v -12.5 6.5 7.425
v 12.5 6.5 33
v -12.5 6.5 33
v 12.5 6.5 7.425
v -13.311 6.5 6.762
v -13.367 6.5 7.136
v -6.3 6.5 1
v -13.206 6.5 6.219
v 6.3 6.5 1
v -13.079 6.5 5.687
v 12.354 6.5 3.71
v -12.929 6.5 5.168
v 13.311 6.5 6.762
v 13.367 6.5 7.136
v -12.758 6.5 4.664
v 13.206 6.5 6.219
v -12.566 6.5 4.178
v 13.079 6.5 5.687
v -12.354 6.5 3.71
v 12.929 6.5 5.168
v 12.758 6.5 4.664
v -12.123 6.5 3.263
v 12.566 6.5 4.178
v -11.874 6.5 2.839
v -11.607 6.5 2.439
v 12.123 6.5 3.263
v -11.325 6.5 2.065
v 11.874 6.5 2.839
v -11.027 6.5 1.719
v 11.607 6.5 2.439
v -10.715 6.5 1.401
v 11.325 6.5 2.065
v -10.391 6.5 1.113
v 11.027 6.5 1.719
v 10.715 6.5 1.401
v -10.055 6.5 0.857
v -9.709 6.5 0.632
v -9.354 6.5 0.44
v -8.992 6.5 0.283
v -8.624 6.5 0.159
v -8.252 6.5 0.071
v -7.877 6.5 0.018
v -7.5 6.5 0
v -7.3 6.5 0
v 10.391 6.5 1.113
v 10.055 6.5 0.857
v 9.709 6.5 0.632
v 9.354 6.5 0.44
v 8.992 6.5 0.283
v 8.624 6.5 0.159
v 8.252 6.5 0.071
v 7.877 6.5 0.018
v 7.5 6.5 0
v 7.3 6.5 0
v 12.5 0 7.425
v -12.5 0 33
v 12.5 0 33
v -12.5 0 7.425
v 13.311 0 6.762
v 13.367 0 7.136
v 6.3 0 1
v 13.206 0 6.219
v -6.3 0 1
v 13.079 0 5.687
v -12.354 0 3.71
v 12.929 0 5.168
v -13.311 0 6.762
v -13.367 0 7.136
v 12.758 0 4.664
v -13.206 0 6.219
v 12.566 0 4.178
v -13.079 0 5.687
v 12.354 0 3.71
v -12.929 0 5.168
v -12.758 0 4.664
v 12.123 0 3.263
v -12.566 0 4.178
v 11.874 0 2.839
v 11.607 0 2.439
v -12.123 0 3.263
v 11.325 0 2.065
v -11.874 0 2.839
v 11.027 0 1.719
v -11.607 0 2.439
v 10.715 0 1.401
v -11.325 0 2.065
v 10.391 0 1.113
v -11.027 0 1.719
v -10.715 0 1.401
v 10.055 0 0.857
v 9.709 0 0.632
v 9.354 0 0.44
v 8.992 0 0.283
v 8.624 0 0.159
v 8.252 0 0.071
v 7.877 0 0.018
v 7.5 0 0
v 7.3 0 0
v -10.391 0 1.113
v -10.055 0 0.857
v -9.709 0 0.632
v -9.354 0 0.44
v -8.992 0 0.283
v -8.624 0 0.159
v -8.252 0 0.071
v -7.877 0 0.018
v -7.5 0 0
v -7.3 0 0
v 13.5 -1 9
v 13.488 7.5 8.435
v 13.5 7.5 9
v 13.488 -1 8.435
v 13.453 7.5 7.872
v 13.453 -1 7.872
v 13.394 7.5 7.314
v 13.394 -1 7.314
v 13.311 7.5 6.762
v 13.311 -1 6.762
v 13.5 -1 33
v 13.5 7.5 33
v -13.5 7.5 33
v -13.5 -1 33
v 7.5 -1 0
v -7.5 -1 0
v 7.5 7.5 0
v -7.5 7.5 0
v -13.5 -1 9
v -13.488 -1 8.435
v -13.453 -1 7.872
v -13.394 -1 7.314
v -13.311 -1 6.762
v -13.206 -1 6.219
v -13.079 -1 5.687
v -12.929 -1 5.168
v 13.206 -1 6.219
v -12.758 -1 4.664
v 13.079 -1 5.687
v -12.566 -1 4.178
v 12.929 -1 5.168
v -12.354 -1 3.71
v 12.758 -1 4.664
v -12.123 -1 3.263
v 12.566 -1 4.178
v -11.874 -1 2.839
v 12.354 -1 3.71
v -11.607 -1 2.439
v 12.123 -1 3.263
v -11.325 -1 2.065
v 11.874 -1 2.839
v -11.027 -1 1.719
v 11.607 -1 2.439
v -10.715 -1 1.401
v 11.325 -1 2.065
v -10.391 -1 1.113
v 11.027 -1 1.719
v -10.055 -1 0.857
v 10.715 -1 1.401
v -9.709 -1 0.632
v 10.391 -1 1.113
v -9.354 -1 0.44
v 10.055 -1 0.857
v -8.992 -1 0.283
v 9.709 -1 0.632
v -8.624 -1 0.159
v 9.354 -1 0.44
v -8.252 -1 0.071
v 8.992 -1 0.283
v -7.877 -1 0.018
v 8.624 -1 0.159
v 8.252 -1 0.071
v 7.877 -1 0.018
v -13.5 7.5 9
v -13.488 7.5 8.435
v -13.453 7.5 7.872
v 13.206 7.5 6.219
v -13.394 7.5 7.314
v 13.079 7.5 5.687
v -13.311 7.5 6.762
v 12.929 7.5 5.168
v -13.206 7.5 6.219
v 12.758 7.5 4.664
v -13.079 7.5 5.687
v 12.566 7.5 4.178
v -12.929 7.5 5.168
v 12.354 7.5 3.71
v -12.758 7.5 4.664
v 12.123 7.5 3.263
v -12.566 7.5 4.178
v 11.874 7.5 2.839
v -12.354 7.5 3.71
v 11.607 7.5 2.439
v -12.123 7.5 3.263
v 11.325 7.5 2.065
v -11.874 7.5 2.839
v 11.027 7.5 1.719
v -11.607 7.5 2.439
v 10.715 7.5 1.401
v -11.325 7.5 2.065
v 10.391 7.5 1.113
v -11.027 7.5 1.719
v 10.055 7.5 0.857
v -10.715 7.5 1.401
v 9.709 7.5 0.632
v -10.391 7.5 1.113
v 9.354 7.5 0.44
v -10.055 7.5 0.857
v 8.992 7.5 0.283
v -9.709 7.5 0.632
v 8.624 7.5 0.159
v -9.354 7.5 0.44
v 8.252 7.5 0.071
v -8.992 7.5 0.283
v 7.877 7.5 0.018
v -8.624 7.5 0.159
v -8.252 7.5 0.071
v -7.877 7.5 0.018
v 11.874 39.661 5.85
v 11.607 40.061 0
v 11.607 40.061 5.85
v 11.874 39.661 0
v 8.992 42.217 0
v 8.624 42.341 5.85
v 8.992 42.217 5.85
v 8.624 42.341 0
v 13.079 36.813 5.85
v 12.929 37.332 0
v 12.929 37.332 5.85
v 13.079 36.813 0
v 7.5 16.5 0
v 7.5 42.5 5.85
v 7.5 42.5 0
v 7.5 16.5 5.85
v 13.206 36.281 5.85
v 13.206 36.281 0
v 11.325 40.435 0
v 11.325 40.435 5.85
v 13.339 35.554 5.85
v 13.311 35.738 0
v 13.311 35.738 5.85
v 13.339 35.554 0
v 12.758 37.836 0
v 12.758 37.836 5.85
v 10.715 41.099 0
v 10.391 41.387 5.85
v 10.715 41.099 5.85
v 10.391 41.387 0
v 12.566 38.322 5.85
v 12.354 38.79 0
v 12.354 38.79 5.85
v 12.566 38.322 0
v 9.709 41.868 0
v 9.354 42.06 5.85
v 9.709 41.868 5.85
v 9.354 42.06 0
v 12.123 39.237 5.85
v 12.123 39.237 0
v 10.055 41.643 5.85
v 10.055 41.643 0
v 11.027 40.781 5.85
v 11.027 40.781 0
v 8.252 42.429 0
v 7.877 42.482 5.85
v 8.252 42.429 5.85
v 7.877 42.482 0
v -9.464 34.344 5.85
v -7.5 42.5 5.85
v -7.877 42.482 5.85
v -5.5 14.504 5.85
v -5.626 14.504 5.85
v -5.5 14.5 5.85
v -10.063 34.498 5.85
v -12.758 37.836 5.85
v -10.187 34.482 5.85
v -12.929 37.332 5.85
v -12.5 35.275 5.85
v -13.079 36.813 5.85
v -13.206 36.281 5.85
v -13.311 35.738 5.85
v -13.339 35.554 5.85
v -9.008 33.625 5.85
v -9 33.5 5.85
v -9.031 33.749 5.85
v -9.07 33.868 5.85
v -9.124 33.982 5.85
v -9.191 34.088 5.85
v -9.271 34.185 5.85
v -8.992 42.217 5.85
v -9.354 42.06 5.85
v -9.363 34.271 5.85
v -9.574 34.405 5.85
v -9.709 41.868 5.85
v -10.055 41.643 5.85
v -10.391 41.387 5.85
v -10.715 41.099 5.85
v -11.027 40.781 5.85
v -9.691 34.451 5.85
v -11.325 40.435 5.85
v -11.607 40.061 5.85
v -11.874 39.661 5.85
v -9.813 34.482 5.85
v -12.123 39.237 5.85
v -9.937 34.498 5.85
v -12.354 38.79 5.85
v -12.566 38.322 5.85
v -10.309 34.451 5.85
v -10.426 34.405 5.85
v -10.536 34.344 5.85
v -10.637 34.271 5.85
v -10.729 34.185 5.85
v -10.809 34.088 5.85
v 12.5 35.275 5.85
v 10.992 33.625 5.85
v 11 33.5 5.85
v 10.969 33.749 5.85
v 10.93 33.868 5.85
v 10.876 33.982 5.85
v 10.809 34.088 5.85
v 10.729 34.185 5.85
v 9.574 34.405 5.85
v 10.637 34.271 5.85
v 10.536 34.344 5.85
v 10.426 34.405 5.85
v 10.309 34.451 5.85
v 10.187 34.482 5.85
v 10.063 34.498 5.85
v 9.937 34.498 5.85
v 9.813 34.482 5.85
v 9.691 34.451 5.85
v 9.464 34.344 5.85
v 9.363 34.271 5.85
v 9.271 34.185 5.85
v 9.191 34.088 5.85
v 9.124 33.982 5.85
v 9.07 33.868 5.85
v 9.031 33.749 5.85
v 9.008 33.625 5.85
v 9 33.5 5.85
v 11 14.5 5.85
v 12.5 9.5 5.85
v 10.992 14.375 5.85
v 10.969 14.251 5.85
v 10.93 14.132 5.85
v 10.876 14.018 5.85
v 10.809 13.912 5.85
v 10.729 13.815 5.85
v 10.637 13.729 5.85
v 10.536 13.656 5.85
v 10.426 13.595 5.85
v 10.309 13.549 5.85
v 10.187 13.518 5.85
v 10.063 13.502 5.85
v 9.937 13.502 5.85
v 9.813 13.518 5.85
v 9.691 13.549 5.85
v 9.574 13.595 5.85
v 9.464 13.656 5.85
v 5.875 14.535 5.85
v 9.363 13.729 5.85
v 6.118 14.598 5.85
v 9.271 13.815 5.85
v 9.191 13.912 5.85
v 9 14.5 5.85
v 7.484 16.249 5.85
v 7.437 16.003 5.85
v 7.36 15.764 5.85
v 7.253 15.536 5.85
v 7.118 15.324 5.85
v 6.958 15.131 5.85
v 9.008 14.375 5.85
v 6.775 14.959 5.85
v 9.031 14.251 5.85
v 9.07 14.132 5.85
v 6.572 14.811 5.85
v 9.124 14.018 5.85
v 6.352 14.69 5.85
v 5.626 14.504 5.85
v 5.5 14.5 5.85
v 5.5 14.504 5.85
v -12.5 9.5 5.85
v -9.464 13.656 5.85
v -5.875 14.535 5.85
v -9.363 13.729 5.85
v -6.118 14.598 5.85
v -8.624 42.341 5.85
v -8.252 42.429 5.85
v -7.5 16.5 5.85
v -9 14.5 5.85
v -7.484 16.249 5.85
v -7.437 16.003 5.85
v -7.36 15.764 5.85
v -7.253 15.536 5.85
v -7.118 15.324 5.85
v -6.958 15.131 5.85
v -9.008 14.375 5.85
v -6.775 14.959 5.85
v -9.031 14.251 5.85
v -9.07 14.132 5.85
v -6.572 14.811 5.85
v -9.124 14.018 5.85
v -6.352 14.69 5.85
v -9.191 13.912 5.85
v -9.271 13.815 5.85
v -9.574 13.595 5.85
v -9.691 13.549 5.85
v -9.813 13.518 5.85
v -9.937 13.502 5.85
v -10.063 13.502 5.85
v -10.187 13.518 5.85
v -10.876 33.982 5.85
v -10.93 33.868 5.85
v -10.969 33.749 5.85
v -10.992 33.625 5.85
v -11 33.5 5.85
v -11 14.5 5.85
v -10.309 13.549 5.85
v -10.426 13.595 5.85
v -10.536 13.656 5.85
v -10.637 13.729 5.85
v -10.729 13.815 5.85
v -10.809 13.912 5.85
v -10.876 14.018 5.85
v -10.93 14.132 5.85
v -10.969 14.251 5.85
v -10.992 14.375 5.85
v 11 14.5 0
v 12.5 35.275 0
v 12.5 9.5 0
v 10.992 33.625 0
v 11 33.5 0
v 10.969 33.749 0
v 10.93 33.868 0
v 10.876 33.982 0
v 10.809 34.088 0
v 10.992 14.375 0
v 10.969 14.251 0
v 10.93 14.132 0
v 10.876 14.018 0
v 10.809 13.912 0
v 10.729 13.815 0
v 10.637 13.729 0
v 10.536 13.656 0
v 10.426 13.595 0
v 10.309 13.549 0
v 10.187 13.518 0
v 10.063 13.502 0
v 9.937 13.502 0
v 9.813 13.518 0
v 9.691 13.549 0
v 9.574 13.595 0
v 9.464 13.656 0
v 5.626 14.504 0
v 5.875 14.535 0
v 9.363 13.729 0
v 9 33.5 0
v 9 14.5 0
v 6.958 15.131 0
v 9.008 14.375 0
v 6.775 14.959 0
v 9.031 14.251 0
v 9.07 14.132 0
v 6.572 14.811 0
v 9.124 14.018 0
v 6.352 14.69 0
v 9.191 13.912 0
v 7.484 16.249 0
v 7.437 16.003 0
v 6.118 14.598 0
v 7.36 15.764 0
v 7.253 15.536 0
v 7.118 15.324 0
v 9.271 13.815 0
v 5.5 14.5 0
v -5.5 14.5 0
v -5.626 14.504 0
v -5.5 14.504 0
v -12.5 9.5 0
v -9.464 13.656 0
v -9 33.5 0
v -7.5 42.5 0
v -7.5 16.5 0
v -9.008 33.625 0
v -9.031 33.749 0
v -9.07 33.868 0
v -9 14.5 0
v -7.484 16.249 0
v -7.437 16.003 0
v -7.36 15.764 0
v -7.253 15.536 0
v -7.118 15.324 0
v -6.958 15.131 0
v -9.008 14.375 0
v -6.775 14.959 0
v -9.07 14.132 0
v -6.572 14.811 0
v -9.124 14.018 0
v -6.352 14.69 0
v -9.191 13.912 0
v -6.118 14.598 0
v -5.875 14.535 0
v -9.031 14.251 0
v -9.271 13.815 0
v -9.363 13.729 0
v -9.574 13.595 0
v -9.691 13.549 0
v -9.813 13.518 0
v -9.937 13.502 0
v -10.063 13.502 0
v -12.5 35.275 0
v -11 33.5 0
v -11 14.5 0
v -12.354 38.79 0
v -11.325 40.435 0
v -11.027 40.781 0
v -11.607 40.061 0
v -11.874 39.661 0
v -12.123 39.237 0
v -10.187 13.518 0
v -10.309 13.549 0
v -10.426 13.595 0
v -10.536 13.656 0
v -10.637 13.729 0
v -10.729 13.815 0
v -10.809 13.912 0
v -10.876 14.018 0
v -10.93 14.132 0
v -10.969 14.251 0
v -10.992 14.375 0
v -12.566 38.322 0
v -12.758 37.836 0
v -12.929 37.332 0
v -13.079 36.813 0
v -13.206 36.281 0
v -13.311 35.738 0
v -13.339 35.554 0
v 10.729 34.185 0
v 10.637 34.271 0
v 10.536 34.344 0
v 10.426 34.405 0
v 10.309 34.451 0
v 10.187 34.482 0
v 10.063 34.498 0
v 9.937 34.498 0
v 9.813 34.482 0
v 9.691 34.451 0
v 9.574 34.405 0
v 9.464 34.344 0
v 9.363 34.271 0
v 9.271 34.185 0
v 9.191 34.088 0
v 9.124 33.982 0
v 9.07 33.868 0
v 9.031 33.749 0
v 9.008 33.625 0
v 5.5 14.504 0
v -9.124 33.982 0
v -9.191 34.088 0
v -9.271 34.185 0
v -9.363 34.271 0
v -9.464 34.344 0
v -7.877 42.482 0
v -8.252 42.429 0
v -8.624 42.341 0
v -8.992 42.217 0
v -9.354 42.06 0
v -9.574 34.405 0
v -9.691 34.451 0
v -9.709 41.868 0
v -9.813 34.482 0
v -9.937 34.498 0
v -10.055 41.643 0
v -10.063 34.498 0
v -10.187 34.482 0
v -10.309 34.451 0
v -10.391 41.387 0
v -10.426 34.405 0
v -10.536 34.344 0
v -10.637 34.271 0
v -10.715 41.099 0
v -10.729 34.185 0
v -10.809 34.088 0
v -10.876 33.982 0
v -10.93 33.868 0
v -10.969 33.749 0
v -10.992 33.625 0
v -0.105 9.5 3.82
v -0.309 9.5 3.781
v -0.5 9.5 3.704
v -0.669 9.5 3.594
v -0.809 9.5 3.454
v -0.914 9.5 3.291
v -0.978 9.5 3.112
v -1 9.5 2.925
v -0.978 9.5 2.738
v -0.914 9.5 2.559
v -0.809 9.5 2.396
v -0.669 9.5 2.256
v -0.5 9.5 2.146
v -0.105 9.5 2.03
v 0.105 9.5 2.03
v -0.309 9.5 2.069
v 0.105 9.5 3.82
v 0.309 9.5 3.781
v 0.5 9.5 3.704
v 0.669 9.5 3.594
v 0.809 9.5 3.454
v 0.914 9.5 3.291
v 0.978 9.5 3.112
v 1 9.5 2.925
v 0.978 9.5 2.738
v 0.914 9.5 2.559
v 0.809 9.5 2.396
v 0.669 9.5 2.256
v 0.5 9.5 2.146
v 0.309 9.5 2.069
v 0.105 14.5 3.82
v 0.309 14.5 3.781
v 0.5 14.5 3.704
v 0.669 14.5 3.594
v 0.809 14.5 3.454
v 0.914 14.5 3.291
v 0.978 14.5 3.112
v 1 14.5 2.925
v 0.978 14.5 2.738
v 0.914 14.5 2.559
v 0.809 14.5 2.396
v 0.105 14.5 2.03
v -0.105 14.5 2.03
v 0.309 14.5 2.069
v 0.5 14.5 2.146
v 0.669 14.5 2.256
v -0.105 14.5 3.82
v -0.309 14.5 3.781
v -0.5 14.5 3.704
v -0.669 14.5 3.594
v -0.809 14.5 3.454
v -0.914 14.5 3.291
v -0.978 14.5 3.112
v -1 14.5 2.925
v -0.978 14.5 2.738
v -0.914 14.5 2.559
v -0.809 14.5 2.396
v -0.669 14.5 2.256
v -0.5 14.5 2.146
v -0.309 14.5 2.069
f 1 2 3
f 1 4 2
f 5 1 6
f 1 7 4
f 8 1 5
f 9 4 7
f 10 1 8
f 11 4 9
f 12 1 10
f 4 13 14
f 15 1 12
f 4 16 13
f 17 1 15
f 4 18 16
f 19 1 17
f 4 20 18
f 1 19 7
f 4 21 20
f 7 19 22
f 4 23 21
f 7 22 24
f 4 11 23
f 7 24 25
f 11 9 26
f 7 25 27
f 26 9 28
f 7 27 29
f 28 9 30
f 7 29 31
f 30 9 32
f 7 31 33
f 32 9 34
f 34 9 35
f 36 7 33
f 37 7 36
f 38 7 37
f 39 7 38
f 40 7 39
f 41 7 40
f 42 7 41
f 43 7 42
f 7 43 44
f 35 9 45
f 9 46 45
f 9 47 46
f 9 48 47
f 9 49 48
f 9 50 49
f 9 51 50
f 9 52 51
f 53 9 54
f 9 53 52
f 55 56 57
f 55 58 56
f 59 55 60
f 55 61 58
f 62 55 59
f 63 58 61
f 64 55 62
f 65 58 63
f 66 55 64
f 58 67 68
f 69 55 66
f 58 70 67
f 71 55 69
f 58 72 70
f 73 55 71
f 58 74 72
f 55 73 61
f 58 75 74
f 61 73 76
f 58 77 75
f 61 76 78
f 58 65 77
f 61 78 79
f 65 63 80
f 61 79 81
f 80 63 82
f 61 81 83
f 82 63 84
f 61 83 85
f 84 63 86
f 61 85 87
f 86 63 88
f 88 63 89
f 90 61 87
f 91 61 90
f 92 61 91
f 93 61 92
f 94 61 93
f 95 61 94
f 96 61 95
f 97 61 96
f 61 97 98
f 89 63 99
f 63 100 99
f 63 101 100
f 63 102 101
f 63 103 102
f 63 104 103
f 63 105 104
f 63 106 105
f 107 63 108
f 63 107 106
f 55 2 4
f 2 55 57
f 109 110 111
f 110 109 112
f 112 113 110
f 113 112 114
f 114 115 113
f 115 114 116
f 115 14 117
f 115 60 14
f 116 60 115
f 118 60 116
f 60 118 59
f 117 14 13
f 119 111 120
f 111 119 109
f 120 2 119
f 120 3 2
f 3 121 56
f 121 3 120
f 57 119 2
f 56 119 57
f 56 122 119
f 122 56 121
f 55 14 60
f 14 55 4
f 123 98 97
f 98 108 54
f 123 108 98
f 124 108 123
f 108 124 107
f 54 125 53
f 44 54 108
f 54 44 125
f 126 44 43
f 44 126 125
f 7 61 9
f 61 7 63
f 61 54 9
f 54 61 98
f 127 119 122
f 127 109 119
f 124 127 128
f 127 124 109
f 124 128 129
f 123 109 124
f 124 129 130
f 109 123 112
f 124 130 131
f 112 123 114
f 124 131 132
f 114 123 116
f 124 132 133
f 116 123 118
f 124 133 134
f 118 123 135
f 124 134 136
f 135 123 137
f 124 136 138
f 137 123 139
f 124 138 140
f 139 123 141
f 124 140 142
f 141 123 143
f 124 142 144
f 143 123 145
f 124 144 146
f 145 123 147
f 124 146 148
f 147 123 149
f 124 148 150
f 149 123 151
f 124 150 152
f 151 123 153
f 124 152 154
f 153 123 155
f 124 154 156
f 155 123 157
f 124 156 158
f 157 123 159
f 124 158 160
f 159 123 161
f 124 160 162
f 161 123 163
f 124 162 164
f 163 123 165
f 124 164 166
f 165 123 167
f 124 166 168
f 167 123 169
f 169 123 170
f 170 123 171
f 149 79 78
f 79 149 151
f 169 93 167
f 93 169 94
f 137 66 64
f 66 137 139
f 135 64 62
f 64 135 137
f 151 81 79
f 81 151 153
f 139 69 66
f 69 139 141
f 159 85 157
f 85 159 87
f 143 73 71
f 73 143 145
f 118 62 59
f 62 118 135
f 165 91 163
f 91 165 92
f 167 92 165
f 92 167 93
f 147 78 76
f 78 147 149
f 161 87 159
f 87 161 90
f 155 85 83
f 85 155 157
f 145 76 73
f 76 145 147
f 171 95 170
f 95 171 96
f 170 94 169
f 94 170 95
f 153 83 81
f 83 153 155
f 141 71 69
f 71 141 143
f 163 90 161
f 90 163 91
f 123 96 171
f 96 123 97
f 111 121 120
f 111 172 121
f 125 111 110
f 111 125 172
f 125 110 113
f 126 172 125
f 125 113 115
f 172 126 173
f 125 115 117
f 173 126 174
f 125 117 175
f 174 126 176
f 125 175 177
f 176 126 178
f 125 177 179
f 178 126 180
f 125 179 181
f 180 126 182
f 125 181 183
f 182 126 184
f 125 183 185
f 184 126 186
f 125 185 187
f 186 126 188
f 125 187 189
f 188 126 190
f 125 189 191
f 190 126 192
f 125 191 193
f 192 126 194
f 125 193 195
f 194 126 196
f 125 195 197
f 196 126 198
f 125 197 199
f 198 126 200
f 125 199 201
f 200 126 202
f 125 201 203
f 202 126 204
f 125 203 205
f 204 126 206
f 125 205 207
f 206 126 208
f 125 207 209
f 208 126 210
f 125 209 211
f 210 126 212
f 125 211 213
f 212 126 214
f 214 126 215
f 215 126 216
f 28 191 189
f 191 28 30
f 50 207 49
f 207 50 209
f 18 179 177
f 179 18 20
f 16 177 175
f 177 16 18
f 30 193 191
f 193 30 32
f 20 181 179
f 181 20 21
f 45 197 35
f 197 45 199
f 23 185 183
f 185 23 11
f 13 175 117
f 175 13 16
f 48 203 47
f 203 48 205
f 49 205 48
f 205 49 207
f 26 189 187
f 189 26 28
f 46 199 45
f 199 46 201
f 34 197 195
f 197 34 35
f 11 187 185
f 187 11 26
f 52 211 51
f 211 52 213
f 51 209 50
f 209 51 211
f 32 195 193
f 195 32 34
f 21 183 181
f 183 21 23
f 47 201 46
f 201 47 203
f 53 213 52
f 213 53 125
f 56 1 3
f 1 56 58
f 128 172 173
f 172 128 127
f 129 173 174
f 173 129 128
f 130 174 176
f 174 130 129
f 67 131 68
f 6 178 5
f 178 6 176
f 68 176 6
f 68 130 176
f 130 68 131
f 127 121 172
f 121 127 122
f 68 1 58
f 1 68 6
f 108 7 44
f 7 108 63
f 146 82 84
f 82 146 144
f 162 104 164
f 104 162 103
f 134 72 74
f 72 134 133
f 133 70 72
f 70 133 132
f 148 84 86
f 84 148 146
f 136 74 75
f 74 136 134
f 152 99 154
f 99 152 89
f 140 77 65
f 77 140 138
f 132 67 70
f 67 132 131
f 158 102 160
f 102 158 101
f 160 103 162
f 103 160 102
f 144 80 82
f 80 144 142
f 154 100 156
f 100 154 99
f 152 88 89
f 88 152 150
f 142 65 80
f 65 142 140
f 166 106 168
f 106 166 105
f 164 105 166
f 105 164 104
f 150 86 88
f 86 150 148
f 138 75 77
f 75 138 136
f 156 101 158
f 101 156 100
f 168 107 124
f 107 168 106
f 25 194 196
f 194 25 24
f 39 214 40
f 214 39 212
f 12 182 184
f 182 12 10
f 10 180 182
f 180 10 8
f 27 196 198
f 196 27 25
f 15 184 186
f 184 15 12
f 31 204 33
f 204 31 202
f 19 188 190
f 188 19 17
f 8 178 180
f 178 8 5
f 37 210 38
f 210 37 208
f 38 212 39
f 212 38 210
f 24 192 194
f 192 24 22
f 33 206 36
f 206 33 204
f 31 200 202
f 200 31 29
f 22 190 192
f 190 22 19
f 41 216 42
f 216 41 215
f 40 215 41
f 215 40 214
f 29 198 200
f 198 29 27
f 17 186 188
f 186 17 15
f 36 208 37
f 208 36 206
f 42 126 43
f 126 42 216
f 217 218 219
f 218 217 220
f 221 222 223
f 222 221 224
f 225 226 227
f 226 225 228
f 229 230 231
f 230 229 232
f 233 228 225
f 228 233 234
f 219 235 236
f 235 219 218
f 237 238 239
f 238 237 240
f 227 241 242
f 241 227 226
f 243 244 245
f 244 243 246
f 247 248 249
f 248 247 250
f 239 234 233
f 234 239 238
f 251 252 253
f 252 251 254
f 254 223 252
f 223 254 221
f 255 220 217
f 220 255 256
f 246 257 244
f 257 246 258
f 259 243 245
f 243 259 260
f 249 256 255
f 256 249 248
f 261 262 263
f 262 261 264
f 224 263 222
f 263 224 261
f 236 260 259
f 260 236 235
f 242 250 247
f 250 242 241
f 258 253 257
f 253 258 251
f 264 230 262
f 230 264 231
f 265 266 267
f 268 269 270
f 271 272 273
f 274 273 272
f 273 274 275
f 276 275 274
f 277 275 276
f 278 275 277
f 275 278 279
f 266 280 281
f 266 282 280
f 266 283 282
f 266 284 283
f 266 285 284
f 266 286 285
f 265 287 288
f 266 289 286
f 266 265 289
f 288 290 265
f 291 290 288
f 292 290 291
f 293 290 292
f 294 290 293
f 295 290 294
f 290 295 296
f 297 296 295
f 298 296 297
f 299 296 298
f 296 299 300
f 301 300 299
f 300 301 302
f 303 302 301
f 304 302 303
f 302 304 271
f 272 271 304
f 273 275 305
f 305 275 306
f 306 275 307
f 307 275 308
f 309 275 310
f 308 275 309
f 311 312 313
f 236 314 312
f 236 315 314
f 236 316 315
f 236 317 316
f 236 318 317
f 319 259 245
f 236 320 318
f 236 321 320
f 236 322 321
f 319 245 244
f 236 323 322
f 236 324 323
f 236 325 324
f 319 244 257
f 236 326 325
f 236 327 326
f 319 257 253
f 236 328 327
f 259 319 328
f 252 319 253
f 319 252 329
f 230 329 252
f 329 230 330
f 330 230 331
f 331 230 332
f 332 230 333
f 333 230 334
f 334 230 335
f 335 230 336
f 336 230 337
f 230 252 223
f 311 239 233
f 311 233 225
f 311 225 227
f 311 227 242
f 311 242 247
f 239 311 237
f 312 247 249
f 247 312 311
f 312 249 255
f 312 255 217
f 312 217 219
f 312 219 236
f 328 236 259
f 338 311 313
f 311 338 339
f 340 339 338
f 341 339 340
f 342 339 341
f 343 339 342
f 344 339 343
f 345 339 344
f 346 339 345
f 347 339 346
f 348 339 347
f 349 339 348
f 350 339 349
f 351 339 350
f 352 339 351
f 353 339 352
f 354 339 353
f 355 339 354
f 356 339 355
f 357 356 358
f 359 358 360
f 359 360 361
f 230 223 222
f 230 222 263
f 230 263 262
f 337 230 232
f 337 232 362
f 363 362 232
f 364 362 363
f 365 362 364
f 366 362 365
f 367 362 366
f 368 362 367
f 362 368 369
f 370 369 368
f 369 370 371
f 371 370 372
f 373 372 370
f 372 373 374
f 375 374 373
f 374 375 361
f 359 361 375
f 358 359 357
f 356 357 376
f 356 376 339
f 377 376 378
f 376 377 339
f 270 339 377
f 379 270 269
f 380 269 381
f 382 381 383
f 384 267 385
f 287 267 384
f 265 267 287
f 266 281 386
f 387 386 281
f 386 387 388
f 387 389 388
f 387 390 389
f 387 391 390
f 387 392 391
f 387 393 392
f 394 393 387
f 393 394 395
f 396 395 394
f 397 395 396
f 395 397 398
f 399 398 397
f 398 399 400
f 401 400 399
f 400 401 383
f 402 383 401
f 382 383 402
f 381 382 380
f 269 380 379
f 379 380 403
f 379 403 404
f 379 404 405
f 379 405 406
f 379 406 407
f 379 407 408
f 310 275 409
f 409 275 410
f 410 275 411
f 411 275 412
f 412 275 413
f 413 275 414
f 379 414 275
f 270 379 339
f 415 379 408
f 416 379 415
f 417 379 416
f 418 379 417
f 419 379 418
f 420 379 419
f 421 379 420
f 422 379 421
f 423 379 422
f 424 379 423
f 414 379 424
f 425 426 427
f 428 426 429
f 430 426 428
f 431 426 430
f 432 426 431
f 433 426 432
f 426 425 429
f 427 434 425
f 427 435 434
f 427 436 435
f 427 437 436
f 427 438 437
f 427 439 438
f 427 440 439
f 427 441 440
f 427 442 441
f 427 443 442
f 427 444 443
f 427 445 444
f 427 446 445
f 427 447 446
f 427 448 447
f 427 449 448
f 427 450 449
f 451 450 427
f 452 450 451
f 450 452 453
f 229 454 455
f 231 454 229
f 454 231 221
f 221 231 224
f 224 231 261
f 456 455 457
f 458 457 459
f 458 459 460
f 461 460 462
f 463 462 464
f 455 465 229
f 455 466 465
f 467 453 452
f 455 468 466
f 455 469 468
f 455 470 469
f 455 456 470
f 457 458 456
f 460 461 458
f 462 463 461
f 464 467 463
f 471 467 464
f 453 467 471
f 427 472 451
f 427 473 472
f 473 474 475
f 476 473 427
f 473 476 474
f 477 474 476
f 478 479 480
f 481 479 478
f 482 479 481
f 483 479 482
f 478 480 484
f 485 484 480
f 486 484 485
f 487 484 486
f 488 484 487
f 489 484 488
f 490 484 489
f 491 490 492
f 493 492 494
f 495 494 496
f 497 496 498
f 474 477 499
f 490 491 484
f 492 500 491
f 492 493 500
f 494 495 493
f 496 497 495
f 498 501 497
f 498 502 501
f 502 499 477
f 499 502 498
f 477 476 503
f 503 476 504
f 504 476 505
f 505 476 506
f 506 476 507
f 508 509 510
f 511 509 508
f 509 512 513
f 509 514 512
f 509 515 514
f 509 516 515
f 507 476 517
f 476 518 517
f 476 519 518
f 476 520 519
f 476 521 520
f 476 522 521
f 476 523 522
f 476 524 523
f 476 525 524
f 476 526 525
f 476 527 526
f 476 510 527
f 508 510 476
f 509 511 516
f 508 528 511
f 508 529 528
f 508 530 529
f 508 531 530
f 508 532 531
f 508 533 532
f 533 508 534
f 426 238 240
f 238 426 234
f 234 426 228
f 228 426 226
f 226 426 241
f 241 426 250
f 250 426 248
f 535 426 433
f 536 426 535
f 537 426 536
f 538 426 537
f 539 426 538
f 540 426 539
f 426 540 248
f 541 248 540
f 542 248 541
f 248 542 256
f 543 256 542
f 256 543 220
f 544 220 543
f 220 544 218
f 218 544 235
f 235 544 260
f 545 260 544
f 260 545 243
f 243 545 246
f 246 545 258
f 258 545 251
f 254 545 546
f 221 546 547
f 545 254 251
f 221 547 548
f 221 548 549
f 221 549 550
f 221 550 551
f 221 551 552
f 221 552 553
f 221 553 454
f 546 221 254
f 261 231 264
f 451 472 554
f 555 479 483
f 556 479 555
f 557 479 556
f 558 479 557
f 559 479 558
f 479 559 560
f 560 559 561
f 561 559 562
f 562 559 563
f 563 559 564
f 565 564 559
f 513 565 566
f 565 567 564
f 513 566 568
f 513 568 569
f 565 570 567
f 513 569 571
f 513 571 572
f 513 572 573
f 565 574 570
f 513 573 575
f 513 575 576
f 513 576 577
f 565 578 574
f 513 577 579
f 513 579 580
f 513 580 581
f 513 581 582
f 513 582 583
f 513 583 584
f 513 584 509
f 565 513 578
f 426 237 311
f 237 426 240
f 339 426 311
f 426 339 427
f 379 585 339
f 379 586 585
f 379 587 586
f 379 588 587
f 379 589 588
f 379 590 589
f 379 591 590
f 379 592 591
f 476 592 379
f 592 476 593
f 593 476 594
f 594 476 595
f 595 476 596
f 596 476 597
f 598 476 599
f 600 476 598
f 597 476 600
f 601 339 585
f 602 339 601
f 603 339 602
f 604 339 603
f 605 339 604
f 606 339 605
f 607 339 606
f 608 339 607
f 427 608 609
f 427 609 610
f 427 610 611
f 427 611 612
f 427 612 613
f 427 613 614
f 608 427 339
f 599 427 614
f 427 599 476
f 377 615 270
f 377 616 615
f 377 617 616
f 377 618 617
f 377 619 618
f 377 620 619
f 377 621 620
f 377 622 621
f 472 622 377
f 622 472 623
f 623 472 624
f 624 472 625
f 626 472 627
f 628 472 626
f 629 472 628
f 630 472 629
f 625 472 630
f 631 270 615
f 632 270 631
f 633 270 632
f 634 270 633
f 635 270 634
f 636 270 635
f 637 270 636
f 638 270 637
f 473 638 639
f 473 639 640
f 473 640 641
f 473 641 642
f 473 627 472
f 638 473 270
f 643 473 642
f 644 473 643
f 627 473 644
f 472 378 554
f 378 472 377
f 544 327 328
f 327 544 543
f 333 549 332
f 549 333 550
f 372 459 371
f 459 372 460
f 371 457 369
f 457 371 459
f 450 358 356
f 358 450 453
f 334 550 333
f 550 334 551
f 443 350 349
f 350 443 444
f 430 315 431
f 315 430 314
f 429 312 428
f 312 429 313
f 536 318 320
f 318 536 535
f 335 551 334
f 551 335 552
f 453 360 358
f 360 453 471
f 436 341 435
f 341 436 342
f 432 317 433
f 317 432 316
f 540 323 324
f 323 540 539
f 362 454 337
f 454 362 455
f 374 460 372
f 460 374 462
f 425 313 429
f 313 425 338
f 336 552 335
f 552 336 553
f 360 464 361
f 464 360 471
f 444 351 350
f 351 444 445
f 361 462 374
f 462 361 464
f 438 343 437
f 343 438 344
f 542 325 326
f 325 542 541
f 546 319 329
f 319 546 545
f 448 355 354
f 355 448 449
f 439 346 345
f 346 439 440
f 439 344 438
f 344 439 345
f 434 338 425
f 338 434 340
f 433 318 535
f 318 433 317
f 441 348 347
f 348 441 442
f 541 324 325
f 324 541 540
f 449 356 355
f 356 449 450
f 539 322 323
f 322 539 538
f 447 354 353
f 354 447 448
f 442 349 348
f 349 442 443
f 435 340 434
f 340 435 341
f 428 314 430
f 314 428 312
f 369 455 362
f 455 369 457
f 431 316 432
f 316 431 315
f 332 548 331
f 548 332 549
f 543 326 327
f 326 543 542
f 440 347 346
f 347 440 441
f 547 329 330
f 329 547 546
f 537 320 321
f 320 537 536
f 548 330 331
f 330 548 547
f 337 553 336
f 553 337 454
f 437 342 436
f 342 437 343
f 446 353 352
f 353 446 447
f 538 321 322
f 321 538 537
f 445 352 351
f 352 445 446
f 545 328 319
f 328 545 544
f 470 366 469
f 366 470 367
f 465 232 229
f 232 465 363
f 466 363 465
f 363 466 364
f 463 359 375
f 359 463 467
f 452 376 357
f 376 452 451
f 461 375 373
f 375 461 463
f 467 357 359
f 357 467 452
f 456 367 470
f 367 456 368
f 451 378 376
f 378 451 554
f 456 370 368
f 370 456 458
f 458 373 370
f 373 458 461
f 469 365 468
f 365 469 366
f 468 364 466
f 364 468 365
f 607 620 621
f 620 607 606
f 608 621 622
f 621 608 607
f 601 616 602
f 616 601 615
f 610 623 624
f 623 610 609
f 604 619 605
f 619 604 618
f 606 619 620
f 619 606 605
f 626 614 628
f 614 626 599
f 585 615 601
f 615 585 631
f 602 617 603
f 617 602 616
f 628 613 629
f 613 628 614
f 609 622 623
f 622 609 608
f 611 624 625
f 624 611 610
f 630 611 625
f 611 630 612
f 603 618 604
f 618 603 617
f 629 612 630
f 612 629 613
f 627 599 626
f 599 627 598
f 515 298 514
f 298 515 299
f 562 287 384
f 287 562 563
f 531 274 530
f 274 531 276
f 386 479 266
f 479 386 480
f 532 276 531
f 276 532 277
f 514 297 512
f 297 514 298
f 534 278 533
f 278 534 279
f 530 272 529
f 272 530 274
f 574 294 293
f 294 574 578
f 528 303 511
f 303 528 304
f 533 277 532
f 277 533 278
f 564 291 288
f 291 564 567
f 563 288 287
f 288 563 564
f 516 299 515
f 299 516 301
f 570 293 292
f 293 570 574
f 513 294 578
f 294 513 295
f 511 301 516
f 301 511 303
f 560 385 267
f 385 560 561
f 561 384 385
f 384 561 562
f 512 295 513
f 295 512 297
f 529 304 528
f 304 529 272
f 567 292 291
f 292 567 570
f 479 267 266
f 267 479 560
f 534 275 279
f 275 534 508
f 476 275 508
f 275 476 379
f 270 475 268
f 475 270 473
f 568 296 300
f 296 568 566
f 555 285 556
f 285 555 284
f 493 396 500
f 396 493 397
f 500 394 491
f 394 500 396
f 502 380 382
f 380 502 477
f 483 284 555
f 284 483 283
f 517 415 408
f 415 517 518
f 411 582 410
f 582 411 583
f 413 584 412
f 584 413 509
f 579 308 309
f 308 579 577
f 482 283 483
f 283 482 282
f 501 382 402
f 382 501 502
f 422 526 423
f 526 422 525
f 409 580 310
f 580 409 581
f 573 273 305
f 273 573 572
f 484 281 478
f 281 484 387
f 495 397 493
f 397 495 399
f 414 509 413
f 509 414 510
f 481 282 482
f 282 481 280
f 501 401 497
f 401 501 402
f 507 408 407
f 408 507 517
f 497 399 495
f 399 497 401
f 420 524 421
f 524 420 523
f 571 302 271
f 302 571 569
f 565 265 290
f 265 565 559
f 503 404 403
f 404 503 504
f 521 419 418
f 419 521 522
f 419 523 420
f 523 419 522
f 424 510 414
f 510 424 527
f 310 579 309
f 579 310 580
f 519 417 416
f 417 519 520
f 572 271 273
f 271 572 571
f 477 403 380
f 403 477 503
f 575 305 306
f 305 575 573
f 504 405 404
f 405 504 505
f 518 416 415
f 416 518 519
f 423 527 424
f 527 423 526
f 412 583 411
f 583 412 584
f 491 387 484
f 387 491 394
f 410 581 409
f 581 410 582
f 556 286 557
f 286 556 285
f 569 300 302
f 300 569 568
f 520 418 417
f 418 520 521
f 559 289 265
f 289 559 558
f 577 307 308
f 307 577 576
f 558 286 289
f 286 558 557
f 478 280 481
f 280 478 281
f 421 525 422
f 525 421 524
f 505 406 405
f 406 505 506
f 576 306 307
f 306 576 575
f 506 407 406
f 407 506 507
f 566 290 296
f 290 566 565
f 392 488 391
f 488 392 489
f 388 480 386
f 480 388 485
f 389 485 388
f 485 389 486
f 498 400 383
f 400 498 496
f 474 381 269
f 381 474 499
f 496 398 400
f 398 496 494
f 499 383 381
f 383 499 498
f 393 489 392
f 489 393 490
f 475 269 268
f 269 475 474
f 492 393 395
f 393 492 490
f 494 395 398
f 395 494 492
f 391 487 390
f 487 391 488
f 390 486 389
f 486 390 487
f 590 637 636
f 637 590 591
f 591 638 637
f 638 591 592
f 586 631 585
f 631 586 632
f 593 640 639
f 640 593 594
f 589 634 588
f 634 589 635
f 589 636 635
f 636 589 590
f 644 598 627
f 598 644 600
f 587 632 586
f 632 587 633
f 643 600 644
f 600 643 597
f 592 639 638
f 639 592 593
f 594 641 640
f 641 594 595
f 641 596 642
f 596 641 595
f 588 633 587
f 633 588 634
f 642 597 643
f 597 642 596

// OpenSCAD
x=15;
y=28;
z=6.5;

wall=1;

pin_wall=1.5;//2
pin_hole=2;//2.5

pin_x= (2*pin_wall)+pin_hole;
pin_y= y-(1.5*(pin_x+wall));

base=false;
style=false;
tolerance=0.9;
cord=2;


module pin( base=false){
    
    
    difference(){
        union(){
            translate([0,pin_y+pin_x,0])difference(){
                scale([1,1.5,1])rotate_extrude(angle=90,cenvexity=2,$fn=100)square([pin_x+wall,z]); 
                translate([0,-2*wall,0])rotate([0,0,atan(2*wall/(pin_x+wall))])cube([5*(pin_x+wall),2*wall,2*z]);
            }
            cube([pin_x,pin_y+pin_x+2*wall,z]);
            translate([-x/2,0,0])cube([x/2,pin_x,z]);
            translate([-pin_hole,pin_x,0])cube([pin_hole,pin_hole,z]);
            
            if(base==true){
                translate([-x/2,0,0])cube([x/3,(1.5*(pin_x+wall))+pin_x+pin_y-wall-0.5,wall]);
            
                translate([-x/2,(1.5*(pin_x+wall))+pin_x+pin_y-wall-0.5-2,0])cube([x/3,2,z]);
            }
            
        }
        
        
        
        hull(){
            translate([pin_x/2,pin_x,0])cylinder(d=pin_hole,h=3*z,center=true,$fn=50);
            translate([pin_x/2,pin_x+pin_y,0])cylinder(d=pin_hole,h=3*z,center=true,$fn=50);
        }
        
        hull(){
            translate([-x/3,pin_x+pin_hole/2,0])cylinder(d=pin_hole,h=3*z,center=true,$fn=50);
            translate([-x/3,2*pin_x+pin_y+pin_hole/2-2,0])cylinder(d=pin_hole,h=3*z,center=true,$fn=50);
        }
        
        translate([-pin_hole,pin_x+pin_hole,0])cylinder(d=2*pin_hole,h=3*z,center=true,$fn=50);
        
        translate([-x/2,10,z/2])rotate([90,0,0])cylinder(d=cord,h=20,$fn=30);
            
           
    }
    
    
    
}

module clip(base=false){
    translate([x/2,0,0])pin(base=base);
    
}

module body(easy = false){
    
    difference(){
        union(){
            difference(){
                union(){
                    translate([pin_x,0,0])cube([wall,pin_y+pin_x,z]);
                    translate([0,pin_y+pin_x,0])intersection(){
                        translate([pin_x,0,0])cube([wall,1.5*(pin_x+wall),z]);
                        scale([1,1.5,1])rotate_extrude(angle=90,cenvexity=2,$fn=100)square([pin_x+wall,z]); 
                        
                    }
                }
                
                translate([0,pin_y+pin_x-0.2,0])difference(){
                    scale([2,3,1])rotate_extrude(angle=90,cenvexity=2,$fn=100)square([pin_x+wall,z]); 
                    translate([0,-2*wall,0])rotate([0,0,atan(2*wall/(pin_x+wall))])cube([5*(pin_x+wall),2*wall,2*z]);
            }
                
                
                
            }
            
            difference(){
                translate([-x/2,(1.5*(pin_x+wall))+pin_x+pin_y-wall,0])cube([x/2-0.2,wall,z]);
                translate([-0.2,(1.5*(pin_x+wall))+pin_y+pin_x-2*wall*sqrt(2),0])rotate([0,0,45])cube([2*wall,2*wall,2*z]);
            }
            
            ////////////bottom
            translate([-x/2,0,-wall])cube([x/2+wall+pin_x,pin_y+pin_x,wall]);
            
            translate([-x/2,pin_y+pin_x,-wall])cube([x/2,(1.5*(pin_x+wall)),wall]);
            
            translate([0,pin_y+pin_x,-wall])scale([1,1.5,1])rotate_extrude(angle=90,cenvexity=2,$fn=100)square([pin_x+wall,wall]);
           
           /////////////////top 
            
            translate([-x/2,0,z])cube([x/2+wall+pin_x,pin_y+pin_x,wall]);
            
            translate([-x/2,pin_y+pin_x,z])cube([x/2,(1.5*(pin_x+wall)),wall]);
            
            translate([0,pin_y+pin_x,z])scale([1,1.5,1])rotate_extrude(angle=90,cenvexity=2,$fn=100)square([pin_x+wall,wall]); 
        
        }
        
        
        if(easy == true)
            translate([pin_x+wall,pin_y+pin_x+(1.5*(pin_x+wall))+2*wall,-wall])rotate([0,0,-180])difference(){
                scale([1,1.5,1])rotate_extrude(angle=90,cenvexity=2,$fn=100)square([pin_x+wall,3*z]); 
                translate([0,-2*wall,0])rotate([0,0,atan(2*wall/(pin_x+wall))])cube([5*(pin_x+wall),2*wall,2*z]);
            }
    }    
    
   
    
    
}


            
module full_clip(base=false){            
    color("red")clip(base=base);
    mirror([1,0,0])color("red")clip(base=base);
}

module full_body(){
    translate([x/2,0,0])color("blue")body(easy=style);
    mirror([1,0,0])translate([x/2,0,0])color("blue")body(easy=style);
}

translate([0,0,y+pin_x])rotate([-90,0,0])full_body();

translate([0,z+3*wall,0])scale([1,1,tolerance])full_clip(base=base);
